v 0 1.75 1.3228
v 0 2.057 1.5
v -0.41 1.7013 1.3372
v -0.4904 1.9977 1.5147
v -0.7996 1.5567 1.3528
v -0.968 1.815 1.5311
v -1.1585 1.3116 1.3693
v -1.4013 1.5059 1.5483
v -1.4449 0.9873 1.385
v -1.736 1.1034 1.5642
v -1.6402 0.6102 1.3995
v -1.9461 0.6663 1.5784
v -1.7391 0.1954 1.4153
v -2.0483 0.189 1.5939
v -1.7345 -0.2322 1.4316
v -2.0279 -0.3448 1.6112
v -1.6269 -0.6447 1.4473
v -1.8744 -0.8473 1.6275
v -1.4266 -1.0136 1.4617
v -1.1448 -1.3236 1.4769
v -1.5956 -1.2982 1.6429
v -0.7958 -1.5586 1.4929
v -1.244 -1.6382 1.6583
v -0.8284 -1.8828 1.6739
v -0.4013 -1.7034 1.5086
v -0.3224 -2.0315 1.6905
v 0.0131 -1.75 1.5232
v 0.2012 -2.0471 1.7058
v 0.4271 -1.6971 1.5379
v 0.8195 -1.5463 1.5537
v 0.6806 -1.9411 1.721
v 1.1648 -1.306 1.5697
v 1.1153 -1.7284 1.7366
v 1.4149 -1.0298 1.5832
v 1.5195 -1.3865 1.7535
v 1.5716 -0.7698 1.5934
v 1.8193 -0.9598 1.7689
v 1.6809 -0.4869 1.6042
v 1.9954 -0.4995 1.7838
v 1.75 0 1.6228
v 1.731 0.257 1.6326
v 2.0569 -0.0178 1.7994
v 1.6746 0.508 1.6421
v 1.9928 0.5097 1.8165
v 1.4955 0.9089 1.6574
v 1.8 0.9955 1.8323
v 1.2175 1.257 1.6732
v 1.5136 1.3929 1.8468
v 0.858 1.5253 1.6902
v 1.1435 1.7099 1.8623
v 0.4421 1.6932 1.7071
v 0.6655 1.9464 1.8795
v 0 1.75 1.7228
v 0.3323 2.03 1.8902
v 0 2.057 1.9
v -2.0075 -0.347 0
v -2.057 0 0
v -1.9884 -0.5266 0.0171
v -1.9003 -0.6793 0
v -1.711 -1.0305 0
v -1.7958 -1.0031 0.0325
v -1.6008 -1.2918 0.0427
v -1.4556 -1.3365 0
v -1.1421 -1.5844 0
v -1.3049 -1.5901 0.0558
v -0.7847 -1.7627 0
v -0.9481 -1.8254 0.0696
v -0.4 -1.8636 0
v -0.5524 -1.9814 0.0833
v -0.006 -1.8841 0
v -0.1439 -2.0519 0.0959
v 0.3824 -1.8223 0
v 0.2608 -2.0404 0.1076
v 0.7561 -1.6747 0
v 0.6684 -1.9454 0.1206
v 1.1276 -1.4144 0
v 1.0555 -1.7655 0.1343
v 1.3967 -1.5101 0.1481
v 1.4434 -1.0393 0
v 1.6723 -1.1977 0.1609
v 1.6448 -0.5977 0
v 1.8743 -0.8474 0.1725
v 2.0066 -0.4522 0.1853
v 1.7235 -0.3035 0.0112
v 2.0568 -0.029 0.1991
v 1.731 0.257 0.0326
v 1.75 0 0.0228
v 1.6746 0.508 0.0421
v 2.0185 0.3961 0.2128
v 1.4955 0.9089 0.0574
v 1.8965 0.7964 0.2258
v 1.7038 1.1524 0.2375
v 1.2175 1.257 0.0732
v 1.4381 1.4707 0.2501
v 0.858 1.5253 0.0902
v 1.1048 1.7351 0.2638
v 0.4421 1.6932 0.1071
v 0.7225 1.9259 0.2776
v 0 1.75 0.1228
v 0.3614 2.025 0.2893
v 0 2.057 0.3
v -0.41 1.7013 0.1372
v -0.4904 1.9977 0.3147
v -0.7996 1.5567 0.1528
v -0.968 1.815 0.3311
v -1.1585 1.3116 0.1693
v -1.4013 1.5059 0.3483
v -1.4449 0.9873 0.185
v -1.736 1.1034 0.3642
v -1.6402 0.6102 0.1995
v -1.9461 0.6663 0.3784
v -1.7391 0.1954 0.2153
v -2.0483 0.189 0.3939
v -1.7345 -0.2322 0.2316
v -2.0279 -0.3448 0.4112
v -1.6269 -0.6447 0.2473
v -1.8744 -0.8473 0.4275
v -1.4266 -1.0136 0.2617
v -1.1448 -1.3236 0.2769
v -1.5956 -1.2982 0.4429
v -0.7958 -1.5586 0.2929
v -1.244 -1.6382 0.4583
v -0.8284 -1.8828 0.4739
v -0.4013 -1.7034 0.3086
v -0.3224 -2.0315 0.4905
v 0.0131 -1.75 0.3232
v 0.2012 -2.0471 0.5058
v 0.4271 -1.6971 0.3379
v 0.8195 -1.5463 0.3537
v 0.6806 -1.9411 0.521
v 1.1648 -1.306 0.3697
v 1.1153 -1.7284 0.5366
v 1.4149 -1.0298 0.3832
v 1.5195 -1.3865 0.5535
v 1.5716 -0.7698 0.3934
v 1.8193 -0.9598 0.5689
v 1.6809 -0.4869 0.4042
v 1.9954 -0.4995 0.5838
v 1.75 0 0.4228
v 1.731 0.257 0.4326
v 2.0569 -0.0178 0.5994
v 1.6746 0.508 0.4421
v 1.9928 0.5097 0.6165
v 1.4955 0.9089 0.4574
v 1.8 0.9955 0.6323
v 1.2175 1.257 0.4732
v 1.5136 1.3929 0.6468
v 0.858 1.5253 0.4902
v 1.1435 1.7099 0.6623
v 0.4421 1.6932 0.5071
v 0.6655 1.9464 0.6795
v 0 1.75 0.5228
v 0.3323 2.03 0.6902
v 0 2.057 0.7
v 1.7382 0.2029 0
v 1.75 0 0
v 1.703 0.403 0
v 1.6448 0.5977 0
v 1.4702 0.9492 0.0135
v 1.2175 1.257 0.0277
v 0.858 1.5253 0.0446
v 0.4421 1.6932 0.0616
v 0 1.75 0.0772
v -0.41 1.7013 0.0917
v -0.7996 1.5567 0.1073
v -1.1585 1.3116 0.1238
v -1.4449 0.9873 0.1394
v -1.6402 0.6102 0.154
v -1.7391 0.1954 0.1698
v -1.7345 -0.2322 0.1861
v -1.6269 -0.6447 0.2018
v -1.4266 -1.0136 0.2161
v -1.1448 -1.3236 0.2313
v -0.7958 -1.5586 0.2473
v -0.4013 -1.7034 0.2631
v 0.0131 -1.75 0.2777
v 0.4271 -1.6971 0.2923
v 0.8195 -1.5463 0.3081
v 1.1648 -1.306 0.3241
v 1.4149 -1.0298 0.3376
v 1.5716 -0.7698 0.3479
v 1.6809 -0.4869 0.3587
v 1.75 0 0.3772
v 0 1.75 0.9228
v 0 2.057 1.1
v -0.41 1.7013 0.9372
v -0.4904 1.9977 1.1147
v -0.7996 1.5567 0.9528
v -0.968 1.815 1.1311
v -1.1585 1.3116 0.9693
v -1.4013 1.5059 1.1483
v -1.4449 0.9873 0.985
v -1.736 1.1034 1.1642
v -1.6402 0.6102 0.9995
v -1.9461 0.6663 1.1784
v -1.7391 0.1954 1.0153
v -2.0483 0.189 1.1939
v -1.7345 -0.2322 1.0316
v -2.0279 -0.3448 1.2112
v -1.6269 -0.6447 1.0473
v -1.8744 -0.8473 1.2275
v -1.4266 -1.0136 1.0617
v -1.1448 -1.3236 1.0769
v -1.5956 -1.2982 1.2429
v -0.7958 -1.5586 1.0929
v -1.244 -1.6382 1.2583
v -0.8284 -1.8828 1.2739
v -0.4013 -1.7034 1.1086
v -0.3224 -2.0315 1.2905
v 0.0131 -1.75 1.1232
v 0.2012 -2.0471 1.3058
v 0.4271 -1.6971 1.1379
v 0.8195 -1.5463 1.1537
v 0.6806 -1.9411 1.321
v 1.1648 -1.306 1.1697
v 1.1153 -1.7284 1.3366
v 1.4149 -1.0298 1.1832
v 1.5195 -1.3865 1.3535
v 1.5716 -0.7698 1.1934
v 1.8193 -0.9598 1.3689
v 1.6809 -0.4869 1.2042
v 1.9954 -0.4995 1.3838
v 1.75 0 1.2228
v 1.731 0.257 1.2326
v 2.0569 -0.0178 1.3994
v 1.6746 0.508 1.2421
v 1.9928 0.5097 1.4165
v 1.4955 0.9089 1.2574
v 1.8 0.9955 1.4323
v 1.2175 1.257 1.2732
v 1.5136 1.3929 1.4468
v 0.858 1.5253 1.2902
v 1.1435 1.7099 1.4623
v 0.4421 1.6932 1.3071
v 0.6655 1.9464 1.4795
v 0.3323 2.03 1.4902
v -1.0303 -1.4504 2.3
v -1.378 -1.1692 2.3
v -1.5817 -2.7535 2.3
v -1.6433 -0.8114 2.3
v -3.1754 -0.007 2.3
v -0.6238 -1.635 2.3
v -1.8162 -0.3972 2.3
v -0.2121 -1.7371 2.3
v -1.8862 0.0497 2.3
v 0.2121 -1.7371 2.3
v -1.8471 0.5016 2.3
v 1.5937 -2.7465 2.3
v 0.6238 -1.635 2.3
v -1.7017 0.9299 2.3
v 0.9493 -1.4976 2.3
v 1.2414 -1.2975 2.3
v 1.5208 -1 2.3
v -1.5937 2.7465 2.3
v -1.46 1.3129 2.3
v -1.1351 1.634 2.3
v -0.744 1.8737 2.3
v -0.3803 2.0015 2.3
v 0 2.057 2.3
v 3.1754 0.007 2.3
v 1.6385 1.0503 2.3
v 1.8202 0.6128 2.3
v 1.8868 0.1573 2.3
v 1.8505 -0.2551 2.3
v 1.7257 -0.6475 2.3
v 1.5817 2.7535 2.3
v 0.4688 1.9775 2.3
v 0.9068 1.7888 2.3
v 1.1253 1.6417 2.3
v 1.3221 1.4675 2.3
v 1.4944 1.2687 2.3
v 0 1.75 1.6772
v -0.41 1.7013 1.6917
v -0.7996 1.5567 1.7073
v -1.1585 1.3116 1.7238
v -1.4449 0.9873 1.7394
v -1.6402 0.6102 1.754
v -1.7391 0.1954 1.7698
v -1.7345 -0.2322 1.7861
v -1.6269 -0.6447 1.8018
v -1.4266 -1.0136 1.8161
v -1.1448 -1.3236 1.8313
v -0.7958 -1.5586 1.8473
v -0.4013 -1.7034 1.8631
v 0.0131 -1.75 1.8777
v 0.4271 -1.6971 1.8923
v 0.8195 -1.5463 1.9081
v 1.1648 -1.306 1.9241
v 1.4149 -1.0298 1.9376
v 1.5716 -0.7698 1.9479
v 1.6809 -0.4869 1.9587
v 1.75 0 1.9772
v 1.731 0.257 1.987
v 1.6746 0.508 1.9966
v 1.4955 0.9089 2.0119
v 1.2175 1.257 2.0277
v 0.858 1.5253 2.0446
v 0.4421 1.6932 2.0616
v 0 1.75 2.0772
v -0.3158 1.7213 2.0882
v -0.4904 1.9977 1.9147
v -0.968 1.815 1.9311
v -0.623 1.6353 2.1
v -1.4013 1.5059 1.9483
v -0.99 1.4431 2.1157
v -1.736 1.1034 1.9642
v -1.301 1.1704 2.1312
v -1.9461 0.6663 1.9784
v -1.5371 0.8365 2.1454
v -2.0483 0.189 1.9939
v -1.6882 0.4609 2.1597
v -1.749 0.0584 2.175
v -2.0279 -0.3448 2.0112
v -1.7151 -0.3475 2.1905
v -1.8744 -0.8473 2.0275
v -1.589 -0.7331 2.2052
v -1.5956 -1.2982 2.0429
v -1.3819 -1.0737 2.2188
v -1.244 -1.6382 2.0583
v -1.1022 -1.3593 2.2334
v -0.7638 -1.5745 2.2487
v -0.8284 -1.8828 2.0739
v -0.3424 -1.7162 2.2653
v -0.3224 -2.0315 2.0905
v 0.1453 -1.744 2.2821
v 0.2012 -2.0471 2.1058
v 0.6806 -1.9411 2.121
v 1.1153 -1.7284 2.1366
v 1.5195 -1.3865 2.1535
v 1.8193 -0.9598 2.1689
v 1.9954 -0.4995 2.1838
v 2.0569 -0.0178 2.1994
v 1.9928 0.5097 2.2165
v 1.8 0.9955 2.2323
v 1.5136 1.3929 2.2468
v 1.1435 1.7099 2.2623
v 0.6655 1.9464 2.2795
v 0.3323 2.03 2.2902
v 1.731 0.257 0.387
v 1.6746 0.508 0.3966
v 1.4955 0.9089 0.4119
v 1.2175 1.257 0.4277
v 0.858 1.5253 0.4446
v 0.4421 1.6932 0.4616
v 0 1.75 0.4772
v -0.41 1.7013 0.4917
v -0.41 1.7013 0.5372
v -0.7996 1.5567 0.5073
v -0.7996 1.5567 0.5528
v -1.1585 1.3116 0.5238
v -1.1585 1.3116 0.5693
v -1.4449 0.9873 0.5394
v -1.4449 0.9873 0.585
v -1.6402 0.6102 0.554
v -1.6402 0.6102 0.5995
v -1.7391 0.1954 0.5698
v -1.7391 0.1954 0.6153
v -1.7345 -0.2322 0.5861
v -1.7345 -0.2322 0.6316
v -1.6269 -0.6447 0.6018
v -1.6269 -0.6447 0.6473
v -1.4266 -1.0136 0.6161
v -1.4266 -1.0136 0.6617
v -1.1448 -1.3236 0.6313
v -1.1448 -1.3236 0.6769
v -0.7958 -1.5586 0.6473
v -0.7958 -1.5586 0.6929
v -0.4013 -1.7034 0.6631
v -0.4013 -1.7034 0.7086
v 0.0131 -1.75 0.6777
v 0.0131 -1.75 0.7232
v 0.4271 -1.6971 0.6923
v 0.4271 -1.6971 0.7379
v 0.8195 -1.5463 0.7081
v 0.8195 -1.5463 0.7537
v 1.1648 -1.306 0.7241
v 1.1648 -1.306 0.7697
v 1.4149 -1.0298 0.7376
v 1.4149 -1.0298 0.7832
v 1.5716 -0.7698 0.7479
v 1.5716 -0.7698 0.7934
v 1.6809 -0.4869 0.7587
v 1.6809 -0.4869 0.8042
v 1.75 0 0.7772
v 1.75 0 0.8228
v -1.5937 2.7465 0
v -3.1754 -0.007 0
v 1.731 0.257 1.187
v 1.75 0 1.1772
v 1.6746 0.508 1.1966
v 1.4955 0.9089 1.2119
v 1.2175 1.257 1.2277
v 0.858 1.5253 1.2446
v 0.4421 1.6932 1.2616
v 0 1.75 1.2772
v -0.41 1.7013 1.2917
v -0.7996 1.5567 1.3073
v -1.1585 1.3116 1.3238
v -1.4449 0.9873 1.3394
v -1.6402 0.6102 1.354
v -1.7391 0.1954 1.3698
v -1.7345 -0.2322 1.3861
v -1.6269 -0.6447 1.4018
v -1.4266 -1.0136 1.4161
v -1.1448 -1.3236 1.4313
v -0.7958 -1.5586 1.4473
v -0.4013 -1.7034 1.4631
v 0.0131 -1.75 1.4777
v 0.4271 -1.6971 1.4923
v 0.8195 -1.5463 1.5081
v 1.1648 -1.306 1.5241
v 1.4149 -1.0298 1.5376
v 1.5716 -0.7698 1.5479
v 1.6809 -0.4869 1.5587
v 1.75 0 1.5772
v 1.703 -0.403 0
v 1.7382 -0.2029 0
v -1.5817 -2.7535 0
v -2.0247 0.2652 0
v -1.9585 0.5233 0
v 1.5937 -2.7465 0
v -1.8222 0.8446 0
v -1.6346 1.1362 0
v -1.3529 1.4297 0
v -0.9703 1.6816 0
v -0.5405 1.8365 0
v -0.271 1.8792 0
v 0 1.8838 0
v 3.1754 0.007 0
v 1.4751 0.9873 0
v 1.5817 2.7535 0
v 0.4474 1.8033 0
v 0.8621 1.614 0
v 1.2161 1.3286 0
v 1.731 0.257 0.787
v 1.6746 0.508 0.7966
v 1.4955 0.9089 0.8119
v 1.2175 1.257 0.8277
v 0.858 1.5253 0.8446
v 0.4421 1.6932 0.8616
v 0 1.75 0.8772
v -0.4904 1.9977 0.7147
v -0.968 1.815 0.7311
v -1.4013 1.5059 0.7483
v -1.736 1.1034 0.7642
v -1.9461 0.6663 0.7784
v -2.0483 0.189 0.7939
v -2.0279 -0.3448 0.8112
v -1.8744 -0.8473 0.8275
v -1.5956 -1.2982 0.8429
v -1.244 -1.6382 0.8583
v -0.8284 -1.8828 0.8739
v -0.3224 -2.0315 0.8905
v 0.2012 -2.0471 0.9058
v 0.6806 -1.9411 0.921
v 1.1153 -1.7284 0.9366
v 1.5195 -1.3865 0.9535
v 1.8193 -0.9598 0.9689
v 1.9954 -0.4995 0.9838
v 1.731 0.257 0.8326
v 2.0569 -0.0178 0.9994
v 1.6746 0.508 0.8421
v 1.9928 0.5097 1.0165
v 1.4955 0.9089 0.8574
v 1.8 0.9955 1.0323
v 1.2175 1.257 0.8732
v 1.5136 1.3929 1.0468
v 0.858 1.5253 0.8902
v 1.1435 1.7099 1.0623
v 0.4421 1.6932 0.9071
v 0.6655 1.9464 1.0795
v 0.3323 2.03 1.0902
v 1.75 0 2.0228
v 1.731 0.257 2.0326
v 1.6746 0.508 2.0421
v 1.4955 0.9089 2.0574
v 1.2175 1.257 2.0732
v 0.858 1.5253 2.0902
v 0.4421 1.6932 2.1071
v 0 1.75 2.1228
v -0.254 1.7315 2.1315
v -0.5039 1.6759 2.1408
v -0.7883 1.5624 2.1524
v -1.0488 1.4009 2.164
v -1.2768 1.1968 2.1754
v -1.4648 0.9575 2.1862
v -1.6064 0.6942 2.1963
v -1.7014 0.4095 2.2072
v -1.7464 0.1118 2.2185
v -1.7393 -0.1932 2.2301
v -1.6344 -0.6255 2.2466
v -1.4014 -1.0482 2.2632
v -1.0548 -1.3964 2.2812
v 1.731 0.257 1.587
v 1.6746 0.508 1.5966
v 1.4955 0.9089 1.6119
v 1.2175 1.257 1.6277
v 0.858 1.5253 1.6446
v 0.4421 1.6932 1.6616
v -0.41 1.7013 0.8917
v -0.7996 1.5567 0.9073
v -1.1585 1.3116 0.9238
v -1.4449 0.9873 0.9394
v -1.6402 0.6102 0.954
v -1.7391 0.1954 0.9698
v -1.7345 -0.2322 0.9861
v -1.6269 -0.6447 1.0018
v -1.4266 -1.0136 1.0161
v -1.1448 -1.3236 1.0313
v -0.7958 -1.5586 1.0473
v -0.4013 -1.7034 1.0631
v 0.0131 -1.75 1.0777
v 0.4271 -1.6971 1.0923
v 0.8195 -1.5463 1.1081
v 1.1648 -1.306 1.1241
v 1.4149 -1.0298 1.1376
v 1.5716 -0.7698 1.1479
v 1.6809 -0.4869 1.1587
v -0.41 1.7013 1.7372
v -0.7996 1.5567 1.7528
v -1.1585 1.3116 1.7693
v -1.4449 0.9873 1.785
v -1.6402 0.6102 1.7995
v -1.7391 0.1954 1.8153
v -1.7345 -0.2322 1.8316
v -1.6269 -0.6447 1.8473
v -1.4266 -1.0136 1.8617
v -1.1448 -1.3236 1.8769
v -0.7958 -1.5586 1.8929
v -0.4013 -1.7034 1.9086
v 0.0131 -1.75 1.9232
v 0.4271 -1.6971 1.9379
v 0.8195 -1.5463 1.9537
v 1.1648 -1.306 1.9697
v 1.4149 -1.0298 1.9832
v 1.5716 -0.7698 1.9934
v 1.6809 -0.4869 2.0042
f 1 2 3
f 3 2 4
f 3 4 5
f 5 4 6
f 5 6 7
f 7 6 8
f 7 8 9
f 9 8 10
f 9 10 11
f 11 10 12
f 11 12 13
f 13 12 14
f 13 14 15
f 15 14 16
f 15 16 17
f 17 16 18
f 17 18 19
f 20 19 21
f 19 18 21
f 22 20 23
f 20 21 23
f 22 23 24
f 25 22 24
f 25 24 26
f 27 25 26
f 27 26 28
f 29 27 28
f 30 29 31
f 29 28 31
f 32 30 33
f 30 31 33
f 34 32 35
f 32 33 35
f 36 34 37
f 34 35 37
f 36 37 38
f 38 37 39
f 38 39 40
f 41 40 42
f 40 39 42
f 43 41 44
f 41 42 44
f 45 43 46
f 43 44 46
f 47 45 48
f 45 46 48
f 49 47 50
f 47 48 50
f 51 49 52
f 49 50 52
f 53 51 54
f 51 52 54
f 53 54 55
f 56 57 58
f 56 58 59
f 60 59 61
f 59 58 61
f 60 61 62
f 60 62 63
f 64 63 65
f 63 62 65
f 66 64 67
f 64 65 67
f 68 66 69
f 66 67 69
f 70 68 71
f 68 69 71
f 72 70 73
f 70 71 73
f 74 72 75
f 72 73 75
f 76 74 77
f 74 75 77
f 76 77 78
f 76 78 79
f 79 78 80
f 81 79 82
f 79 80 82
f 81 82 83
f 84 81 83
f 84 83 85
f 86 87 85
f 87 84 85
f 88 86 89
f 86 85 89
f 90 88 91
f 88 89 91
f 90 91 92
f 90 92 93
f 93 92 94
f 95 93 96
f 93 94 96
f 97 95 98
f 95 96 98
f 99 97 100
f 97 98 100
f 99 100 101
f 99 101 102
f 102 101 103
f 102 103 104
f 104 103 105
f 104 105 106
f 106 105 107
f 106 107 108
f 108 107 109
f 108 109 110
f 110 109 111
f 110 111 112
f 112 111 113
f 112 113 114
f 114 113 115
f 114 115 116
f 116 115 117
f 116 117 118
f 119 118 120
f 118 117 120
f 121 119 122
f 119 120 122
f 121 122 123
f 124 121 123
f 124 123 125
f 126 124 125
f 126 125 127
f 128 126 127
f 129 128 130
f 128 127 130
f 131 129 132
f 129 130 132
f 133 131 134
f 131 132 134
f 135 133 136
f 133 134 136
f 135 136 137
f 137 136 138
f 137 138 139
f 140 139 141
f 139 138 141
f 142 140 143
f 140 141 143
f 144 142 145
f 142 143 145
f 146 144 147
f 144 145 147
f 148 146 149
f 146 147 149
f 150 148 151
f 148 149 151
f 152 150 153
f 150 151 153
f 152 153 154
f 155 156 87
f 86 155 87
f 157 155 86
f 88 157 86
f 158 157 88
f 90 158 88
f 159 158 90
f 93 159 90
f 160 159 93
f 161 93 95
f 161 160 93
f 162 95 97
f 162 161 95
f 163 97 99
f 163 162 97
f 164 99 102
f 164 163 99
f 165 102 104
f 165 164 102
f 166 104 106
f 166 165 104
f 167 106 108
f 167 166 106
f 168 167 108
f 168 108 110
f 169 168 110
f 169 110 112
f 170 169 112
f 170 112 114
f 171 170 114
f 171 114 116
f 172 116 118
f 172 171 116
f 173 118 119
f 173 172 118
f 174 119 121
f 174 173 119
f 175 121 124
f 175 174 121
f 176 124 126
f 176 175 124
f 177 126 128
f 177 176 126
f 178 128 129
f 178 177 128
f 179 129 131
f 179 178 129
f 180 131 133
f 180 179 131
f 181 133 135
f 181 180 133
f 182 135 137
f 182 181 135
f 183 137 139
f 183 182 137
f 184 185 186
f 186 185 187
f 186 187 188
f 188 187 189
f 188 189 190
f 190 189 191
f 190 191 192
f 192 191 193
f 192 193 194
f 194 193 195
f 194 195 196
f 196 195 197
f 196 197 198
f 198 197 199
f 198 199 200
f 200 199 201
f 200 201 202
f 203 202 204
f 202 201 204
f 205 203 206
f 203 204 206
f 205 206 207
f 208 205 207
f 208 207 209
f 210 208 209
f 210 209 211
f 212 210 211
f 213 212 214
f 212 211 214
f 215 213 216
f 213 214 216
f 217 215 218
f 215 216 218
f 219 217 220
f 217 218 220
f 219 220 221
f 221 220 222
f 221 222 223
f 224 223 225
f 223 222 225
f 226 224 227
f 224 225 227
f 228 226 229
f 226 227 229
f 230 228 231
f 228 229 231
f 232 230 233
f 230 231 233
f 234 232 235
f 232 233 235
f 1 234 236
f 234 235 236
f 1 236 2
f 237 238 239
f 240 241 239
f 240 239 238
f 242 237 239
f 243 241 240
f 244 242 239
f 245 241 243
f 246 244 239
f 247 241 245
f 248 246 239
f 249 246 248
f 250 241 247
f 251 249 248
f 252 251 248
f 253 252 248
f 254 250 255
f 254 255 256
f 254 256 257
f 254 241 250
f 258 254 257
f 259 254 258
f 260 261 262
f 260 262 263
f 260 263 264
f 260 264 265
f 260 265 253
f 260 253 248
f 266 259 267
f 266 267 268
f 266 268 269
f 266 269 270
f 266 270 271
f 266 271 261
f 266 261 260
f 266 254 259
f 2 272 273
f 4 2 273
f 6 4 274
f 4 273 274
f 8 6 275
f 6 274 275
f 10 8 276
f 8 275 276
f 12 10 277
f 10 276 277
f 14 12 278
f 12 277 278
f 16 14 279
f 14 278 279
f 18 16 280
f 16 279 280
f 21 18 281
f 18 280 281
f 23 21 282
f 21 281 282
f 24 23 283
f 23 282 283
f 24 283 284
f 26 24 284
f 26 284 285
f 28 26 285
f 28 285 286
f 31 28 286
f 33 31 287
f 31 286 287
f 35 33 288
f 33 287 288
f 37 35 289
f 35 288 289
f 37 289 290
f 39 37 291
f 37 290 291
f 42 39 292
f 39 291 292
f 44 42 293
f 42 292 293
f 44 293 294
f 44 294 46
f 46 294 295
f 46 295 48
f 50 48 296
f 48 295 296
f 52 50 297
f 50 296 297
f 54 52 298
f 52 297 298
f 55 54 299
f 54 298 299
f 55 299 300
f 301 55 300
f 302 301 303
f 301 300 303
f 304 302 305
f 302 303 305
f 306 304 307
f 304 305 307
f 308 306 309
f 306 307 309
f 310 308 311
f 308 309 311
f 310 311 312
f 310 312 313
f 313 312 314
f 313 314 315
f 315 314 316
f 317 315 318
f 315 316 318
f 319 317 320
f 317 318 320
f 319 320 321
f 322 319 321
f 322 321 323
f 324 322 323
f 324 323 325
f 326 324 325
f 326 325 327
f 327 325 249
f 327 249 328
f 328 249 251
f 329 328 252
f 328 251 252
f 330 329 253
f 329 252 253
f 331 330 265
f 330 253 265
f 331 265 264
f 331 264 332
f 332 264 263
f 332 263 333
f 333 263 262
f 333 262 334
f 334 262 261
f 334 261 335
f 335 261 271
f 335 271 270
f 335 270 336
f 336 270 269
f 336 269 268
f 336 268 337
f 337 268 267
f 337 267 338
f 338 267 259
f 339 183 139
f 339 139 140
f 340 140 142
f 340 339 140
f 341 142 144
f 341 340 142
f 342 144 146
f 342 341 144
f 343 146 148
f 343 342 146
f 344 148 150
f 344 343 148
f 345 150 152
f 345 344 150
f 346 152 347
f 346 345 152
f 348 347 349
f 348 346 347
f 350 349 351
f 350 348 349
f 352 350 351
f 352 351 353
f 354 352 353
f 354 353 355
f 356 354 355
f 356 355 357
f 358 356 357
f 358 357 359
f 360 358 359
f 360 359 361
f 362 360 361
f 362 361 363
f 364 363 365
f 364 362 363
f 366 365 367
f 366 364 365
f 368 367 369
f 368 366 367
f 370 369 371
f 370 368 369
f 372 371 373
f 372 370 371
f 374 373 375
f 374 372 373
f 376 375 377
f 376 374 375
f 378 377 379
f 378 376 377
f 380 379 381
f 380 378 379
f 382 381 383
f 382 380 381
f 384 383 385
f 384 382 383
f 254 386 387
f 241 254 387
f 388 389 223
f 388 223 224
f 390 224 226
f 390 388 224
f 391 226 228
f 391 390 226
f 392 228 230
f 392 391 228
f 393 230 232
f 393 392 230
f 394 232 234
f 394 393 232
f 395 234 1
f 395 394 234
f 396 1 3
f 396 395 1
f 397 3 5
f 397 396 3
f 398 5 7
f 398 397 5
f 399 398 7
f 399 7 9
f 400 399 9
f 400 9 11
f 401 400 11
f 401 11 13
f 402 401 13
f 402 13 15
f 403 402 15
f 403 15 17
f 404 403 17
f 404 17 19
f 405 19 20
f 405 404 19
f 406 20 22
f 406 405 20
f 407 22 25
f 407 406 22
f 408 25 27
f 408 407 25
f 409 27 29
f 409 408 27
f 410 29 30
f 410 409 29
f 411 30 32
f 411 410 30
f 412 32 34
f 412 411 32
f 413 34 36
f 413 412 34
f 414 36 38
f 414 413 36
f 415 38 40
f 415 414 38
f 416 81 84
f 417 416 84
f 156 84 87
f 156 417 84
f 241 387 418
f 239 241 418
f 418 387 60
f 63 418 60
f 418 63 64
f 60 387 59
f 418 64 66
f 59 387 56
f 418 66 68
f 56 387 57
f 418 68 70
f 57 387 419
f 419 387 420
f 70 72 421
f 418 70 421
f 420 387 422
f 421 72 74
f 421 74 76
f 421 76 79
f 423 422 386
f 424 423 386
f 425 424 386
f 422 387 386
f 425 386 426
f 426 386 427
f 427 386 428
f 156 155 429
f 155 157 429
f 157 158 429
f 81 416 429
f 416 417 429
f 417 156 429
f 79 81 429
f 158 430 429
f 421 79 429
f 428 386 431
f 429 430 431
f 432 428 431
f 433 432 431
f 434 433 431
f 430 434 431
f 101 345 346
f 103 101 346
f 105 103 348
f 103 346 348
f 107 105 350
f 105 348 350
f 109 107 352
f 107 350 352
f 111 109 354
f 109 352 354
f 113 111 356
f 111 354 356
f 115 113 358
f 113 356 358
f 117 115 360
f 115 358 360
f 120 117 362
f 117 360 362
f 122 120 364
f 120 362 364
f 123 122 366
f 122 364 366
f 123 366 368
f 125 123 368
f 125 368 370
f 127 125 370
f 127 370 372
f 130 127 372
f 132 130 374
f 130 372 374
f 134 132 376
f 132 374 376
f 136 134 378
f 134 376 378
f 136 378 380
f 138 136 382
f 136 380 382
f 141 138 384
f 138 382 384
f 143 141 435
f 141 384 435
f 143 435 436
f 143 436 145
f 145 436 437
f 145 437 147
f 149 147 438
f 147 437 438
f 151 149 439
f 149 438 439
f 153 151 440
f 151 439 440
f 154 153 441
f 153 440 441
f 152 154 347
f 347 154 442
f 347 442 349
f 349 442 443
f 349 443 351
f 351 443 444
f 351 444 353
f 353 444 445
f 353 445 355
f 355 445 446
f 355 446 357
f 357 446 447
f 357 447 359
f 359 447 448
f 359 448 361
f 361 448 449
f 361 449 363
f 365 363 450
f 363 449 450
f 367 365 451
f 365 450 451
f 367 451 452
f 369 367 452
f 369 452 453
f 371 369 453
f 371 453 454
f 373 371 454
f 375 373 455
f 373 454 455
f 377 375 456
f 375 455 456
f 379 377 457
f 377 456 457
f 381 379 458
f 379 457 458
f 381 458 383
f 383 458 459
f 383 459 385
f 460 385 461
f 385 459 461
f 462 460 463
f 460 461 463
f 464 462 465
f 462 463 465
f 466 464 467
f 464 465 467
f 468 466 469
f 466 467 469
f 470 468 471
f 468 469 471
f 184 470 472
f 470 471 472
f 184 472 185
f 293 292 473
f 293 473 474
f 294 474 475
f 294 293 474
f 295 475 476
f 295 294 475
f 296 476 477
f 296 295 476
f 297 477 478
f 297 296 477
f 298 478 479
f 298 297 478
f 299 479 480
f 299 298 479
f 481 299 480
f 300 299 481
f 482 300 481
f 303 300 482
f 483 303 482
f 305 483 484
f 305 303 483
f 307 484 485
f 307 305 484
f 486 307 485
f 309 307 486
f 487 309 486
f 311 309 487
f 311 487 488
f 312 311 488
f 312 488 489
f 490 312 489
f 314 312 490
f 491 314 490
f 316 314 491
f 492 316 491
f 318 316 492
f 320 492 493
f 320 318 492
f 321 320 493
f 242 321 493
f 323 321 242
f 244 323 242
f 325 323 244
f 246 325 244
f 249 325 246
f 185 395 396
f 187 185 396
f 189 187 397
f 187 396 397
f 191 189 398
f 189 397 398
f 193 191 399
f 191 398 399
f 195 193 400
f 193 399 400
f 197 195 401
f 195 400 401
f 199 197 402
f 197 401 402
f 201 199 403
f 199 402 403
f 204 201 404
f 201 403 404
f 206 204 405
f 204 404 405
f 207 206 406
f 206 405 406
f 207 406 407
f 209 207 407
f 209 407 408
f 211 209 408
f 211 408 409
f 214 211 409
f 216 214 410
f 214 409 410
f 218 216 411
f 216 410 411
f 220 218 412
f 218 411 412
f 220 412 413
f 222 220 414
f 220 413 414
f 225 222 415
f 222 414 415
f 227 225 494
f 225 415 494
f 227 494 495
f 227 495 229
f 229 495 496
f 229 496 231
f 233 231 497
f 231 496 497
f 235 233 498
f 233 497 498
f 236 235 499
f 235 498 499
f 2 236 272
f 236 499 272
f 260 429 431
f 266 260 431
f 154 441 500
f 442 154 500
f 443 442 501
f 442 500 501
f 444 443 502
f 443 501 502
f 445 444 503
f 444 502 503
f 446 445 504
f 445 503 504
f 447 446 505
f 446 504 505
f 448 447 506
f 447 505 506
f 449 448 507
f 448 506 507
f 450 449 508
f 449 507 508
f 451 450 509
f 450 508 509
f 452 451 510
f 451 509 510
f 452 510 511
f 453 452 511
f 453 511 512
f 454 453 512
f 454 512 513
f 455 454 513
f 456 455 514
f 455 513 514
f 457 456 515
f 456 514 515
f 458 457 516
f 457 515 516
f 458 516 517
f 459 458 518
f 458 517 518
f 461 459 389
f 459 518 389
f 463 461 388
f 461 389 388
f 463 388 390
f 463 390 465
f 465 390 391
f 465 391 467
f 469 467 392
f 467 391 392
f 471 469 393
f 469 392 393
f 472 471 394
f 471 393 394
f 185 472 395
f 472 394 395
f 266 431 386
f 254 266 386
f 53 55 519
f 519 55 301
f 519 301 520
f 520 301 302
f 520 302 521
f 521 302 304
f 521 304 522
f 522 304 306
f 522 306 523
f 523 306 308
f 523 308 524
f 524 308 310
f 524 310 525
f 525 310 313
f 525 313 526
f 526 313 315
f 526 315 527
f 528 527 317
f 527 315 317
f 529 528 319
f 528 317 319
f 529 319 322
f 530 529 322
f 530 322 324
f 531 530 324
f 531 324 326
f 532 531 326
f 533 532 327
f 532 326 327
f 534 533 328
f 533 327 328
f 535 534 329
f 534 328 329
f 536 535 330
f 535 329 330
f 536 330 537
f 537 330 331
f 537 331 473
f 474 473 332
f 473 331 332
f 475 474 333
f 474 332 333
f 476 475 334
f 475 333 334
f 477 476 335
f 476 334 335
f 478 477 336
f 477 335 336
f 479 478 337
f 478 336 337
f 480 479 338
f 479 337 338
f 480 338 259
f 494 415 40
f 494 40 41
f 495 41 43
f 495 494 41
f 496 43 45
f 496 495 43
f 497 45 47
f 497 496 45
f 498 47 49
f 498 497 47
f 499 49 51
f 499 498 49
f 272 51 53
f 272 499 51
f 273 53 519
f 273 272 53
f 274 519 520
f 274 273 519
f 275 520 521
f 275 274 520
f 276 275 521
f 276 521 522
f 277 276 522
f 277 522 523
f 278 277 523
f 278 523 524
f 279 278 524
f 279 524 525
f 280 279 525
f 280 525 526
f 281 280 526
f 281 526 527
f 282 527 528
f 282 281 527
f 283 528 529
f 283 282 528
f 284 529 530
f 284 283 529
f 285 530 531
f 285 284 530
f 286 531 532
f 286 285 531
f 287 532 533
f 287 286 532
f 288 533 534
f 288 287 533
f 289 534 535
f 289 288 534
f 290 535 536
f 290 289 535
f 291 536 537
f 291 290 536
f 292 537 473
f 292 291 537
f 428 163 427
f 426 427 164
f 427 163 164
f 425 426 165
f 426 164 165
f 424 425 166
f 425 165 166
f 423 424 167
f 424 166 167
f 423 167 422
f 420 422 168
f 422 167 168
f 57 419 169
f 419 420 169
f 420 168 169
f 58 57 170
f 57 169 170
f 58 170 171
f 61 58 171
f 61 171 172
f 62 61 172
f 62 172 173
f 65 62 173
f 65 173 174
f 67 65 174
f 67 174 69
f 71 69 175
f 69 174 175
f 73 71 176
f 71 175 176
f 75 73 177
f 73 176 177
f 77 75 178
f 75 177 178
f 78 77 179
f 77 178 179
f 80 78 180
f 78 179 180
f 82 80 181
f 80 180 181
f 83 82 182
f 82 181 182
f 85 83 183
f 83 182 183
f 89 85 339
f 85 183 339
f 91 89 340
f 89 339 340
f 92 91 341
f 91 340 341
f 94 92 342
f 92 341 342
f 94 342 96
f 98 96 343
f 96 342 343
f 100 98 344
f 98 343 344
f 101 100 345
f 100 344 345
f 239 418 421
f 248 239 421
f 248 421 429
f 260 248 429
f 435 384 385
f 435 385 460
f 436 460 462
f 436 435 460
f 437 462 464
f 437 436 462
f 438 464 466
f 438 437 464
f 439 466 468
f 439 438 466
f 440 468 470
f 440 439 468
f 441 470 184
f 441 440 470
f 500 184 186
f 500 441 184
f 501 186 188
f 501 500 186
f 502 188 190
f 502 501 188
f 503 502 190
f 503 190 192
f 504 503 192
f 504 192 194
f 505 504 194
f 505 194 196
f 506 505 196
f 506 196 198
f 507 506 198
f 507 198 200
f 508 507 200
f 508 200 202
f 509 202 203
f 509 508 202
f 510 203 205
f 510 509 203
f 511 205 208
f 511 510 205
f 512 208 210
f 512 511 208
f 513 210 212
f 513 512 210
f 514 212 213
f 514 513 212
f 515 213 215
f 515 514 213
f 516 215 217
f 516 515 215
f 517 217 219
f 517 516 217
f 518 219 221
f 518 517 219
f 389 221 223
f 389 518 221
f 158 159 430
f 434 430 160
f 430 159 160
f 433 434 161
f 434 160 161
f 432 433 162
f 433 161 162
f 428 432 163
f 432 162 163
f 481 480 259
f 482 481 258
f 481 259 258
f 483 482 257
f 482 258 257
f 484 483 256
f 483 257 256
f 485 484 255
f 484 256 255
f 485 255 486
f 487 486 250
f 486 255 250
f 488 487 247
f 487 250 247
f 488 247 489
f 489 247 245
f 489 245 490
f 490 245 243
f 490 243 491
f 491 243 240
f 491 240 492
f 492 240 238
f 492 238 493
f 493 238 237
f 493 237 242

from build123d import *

# Parameters (mm, degrees)
SKETCH1_R           = 1.75
BOSS_EXTRUDE1_DEPTH = 2.3
CUT_SWEEP2_PITCH    = 0.4


with BuildPart() as part:
    # Sketch1 → Boss-Extrude1 (new body)
    with BuildSketch(Plane.XY):
        Polygon((1.593747789, -2.746507112), (3.175418826, 0.006972516), (1.581671036, 2.753479629), (-1.593747789, 2.746507112), (-3.175418826, -0.006972516), (-1.581671036, -2.753479629), align=None)
        Circle(SKETCH1_R, mode=Mode.SUBTRACT)
    extrude(amount=BOSS_EXTRUDE1_DEPTH)

    # Cut-Sweep2: arcs per turn and ends read off the stored shape
    # Cut-Sweep2: the profile of Sketch9 screwed along a right-hand helix through 10 turns, 6 arcs to a turn; built about Z, then put on its axis
    cut_sweep2_z = Axis((0, 0, 0), (0, 0, 1))
    cut_sweep2_corners = [(0, -2.056972516, -0.5), (0, -1.606972516, -0.240192379), (0, -1.606972516, -0.759807621)]
    with BuildLine(mode=Mode.PRIVATE) as cut_sweep2_profile:
        Line(cut_sweep2_corners[0], cut_sweep2_corners[1])
        Line(cut_sweep2_corners[1], cut_sweep2_corners[2])
        Line(cut_sweep2_corners[2], cut_sweep2_corners[0])
    cut_sweep2_cap = Face(cut_sweep2_profile.wire())
    cut_sweep2_turn_angles = [0, 30, 60, 90, 120, 150, 180, 210, 240, 270, 300, 330, 360]
    cut_sweep2_turn_weights = [1, 0.8660254037844387, 1, 0.8660254037844387, 1, 0.8660254037844387, 1, 0.8660254037844387, 1, 0.8660254037844387, 1, 0.8660254037844387, 1]
    cut_sweep2_turn_rails = [Edge.make_bspline([Vector(p[0], p[1], 0).rotate(cut_sweep2_z, cut_sweep2_turn_angles[k]) / cut_sweep2_turn_weights[k] + Vector(0, 0, p[2] + CUT_SWEEP2_PITCH * cut_sweep2_turn_angles[k] / 360) for k in range(13)], [0, 0, 0, 1, 1, 2, 2, 3, 3, 4, 4, 5, 5, 6, 6, 6], 2, cut_sweep2_turn_weights) for p in cut_sweep2_corners]
    cut_sweep2_turn_sides = [Face.make_surface_from_curves(cut_sweep2_turn_rails[p[0]], cut_sweep2_turn_rails[p[1]]) for p in [(0, 1), (1, 2), (2, 0)]]
    cut_sweep2 = Plane(origin=(0, 0, 0), x_dir=(-1, 0, 0), z_dir=(0, 0, 1)) * Solid(Shell([*[p.moved(Location((0, 0, CUT_SWEEP2_PITCH * i))) for i in range(10) for p in cut_sweep2_turn_sides], cut_sweep2_cap, cut_sweep2_cap.rotate(cut_sweep2_z, 3600).moved(Location((0, 0, CUT_SWEEP2_PITCH * 3600 / 360)))]))
    add(cut_sweep2, mode=Mode.SUBTRACT)


solid = part.part
